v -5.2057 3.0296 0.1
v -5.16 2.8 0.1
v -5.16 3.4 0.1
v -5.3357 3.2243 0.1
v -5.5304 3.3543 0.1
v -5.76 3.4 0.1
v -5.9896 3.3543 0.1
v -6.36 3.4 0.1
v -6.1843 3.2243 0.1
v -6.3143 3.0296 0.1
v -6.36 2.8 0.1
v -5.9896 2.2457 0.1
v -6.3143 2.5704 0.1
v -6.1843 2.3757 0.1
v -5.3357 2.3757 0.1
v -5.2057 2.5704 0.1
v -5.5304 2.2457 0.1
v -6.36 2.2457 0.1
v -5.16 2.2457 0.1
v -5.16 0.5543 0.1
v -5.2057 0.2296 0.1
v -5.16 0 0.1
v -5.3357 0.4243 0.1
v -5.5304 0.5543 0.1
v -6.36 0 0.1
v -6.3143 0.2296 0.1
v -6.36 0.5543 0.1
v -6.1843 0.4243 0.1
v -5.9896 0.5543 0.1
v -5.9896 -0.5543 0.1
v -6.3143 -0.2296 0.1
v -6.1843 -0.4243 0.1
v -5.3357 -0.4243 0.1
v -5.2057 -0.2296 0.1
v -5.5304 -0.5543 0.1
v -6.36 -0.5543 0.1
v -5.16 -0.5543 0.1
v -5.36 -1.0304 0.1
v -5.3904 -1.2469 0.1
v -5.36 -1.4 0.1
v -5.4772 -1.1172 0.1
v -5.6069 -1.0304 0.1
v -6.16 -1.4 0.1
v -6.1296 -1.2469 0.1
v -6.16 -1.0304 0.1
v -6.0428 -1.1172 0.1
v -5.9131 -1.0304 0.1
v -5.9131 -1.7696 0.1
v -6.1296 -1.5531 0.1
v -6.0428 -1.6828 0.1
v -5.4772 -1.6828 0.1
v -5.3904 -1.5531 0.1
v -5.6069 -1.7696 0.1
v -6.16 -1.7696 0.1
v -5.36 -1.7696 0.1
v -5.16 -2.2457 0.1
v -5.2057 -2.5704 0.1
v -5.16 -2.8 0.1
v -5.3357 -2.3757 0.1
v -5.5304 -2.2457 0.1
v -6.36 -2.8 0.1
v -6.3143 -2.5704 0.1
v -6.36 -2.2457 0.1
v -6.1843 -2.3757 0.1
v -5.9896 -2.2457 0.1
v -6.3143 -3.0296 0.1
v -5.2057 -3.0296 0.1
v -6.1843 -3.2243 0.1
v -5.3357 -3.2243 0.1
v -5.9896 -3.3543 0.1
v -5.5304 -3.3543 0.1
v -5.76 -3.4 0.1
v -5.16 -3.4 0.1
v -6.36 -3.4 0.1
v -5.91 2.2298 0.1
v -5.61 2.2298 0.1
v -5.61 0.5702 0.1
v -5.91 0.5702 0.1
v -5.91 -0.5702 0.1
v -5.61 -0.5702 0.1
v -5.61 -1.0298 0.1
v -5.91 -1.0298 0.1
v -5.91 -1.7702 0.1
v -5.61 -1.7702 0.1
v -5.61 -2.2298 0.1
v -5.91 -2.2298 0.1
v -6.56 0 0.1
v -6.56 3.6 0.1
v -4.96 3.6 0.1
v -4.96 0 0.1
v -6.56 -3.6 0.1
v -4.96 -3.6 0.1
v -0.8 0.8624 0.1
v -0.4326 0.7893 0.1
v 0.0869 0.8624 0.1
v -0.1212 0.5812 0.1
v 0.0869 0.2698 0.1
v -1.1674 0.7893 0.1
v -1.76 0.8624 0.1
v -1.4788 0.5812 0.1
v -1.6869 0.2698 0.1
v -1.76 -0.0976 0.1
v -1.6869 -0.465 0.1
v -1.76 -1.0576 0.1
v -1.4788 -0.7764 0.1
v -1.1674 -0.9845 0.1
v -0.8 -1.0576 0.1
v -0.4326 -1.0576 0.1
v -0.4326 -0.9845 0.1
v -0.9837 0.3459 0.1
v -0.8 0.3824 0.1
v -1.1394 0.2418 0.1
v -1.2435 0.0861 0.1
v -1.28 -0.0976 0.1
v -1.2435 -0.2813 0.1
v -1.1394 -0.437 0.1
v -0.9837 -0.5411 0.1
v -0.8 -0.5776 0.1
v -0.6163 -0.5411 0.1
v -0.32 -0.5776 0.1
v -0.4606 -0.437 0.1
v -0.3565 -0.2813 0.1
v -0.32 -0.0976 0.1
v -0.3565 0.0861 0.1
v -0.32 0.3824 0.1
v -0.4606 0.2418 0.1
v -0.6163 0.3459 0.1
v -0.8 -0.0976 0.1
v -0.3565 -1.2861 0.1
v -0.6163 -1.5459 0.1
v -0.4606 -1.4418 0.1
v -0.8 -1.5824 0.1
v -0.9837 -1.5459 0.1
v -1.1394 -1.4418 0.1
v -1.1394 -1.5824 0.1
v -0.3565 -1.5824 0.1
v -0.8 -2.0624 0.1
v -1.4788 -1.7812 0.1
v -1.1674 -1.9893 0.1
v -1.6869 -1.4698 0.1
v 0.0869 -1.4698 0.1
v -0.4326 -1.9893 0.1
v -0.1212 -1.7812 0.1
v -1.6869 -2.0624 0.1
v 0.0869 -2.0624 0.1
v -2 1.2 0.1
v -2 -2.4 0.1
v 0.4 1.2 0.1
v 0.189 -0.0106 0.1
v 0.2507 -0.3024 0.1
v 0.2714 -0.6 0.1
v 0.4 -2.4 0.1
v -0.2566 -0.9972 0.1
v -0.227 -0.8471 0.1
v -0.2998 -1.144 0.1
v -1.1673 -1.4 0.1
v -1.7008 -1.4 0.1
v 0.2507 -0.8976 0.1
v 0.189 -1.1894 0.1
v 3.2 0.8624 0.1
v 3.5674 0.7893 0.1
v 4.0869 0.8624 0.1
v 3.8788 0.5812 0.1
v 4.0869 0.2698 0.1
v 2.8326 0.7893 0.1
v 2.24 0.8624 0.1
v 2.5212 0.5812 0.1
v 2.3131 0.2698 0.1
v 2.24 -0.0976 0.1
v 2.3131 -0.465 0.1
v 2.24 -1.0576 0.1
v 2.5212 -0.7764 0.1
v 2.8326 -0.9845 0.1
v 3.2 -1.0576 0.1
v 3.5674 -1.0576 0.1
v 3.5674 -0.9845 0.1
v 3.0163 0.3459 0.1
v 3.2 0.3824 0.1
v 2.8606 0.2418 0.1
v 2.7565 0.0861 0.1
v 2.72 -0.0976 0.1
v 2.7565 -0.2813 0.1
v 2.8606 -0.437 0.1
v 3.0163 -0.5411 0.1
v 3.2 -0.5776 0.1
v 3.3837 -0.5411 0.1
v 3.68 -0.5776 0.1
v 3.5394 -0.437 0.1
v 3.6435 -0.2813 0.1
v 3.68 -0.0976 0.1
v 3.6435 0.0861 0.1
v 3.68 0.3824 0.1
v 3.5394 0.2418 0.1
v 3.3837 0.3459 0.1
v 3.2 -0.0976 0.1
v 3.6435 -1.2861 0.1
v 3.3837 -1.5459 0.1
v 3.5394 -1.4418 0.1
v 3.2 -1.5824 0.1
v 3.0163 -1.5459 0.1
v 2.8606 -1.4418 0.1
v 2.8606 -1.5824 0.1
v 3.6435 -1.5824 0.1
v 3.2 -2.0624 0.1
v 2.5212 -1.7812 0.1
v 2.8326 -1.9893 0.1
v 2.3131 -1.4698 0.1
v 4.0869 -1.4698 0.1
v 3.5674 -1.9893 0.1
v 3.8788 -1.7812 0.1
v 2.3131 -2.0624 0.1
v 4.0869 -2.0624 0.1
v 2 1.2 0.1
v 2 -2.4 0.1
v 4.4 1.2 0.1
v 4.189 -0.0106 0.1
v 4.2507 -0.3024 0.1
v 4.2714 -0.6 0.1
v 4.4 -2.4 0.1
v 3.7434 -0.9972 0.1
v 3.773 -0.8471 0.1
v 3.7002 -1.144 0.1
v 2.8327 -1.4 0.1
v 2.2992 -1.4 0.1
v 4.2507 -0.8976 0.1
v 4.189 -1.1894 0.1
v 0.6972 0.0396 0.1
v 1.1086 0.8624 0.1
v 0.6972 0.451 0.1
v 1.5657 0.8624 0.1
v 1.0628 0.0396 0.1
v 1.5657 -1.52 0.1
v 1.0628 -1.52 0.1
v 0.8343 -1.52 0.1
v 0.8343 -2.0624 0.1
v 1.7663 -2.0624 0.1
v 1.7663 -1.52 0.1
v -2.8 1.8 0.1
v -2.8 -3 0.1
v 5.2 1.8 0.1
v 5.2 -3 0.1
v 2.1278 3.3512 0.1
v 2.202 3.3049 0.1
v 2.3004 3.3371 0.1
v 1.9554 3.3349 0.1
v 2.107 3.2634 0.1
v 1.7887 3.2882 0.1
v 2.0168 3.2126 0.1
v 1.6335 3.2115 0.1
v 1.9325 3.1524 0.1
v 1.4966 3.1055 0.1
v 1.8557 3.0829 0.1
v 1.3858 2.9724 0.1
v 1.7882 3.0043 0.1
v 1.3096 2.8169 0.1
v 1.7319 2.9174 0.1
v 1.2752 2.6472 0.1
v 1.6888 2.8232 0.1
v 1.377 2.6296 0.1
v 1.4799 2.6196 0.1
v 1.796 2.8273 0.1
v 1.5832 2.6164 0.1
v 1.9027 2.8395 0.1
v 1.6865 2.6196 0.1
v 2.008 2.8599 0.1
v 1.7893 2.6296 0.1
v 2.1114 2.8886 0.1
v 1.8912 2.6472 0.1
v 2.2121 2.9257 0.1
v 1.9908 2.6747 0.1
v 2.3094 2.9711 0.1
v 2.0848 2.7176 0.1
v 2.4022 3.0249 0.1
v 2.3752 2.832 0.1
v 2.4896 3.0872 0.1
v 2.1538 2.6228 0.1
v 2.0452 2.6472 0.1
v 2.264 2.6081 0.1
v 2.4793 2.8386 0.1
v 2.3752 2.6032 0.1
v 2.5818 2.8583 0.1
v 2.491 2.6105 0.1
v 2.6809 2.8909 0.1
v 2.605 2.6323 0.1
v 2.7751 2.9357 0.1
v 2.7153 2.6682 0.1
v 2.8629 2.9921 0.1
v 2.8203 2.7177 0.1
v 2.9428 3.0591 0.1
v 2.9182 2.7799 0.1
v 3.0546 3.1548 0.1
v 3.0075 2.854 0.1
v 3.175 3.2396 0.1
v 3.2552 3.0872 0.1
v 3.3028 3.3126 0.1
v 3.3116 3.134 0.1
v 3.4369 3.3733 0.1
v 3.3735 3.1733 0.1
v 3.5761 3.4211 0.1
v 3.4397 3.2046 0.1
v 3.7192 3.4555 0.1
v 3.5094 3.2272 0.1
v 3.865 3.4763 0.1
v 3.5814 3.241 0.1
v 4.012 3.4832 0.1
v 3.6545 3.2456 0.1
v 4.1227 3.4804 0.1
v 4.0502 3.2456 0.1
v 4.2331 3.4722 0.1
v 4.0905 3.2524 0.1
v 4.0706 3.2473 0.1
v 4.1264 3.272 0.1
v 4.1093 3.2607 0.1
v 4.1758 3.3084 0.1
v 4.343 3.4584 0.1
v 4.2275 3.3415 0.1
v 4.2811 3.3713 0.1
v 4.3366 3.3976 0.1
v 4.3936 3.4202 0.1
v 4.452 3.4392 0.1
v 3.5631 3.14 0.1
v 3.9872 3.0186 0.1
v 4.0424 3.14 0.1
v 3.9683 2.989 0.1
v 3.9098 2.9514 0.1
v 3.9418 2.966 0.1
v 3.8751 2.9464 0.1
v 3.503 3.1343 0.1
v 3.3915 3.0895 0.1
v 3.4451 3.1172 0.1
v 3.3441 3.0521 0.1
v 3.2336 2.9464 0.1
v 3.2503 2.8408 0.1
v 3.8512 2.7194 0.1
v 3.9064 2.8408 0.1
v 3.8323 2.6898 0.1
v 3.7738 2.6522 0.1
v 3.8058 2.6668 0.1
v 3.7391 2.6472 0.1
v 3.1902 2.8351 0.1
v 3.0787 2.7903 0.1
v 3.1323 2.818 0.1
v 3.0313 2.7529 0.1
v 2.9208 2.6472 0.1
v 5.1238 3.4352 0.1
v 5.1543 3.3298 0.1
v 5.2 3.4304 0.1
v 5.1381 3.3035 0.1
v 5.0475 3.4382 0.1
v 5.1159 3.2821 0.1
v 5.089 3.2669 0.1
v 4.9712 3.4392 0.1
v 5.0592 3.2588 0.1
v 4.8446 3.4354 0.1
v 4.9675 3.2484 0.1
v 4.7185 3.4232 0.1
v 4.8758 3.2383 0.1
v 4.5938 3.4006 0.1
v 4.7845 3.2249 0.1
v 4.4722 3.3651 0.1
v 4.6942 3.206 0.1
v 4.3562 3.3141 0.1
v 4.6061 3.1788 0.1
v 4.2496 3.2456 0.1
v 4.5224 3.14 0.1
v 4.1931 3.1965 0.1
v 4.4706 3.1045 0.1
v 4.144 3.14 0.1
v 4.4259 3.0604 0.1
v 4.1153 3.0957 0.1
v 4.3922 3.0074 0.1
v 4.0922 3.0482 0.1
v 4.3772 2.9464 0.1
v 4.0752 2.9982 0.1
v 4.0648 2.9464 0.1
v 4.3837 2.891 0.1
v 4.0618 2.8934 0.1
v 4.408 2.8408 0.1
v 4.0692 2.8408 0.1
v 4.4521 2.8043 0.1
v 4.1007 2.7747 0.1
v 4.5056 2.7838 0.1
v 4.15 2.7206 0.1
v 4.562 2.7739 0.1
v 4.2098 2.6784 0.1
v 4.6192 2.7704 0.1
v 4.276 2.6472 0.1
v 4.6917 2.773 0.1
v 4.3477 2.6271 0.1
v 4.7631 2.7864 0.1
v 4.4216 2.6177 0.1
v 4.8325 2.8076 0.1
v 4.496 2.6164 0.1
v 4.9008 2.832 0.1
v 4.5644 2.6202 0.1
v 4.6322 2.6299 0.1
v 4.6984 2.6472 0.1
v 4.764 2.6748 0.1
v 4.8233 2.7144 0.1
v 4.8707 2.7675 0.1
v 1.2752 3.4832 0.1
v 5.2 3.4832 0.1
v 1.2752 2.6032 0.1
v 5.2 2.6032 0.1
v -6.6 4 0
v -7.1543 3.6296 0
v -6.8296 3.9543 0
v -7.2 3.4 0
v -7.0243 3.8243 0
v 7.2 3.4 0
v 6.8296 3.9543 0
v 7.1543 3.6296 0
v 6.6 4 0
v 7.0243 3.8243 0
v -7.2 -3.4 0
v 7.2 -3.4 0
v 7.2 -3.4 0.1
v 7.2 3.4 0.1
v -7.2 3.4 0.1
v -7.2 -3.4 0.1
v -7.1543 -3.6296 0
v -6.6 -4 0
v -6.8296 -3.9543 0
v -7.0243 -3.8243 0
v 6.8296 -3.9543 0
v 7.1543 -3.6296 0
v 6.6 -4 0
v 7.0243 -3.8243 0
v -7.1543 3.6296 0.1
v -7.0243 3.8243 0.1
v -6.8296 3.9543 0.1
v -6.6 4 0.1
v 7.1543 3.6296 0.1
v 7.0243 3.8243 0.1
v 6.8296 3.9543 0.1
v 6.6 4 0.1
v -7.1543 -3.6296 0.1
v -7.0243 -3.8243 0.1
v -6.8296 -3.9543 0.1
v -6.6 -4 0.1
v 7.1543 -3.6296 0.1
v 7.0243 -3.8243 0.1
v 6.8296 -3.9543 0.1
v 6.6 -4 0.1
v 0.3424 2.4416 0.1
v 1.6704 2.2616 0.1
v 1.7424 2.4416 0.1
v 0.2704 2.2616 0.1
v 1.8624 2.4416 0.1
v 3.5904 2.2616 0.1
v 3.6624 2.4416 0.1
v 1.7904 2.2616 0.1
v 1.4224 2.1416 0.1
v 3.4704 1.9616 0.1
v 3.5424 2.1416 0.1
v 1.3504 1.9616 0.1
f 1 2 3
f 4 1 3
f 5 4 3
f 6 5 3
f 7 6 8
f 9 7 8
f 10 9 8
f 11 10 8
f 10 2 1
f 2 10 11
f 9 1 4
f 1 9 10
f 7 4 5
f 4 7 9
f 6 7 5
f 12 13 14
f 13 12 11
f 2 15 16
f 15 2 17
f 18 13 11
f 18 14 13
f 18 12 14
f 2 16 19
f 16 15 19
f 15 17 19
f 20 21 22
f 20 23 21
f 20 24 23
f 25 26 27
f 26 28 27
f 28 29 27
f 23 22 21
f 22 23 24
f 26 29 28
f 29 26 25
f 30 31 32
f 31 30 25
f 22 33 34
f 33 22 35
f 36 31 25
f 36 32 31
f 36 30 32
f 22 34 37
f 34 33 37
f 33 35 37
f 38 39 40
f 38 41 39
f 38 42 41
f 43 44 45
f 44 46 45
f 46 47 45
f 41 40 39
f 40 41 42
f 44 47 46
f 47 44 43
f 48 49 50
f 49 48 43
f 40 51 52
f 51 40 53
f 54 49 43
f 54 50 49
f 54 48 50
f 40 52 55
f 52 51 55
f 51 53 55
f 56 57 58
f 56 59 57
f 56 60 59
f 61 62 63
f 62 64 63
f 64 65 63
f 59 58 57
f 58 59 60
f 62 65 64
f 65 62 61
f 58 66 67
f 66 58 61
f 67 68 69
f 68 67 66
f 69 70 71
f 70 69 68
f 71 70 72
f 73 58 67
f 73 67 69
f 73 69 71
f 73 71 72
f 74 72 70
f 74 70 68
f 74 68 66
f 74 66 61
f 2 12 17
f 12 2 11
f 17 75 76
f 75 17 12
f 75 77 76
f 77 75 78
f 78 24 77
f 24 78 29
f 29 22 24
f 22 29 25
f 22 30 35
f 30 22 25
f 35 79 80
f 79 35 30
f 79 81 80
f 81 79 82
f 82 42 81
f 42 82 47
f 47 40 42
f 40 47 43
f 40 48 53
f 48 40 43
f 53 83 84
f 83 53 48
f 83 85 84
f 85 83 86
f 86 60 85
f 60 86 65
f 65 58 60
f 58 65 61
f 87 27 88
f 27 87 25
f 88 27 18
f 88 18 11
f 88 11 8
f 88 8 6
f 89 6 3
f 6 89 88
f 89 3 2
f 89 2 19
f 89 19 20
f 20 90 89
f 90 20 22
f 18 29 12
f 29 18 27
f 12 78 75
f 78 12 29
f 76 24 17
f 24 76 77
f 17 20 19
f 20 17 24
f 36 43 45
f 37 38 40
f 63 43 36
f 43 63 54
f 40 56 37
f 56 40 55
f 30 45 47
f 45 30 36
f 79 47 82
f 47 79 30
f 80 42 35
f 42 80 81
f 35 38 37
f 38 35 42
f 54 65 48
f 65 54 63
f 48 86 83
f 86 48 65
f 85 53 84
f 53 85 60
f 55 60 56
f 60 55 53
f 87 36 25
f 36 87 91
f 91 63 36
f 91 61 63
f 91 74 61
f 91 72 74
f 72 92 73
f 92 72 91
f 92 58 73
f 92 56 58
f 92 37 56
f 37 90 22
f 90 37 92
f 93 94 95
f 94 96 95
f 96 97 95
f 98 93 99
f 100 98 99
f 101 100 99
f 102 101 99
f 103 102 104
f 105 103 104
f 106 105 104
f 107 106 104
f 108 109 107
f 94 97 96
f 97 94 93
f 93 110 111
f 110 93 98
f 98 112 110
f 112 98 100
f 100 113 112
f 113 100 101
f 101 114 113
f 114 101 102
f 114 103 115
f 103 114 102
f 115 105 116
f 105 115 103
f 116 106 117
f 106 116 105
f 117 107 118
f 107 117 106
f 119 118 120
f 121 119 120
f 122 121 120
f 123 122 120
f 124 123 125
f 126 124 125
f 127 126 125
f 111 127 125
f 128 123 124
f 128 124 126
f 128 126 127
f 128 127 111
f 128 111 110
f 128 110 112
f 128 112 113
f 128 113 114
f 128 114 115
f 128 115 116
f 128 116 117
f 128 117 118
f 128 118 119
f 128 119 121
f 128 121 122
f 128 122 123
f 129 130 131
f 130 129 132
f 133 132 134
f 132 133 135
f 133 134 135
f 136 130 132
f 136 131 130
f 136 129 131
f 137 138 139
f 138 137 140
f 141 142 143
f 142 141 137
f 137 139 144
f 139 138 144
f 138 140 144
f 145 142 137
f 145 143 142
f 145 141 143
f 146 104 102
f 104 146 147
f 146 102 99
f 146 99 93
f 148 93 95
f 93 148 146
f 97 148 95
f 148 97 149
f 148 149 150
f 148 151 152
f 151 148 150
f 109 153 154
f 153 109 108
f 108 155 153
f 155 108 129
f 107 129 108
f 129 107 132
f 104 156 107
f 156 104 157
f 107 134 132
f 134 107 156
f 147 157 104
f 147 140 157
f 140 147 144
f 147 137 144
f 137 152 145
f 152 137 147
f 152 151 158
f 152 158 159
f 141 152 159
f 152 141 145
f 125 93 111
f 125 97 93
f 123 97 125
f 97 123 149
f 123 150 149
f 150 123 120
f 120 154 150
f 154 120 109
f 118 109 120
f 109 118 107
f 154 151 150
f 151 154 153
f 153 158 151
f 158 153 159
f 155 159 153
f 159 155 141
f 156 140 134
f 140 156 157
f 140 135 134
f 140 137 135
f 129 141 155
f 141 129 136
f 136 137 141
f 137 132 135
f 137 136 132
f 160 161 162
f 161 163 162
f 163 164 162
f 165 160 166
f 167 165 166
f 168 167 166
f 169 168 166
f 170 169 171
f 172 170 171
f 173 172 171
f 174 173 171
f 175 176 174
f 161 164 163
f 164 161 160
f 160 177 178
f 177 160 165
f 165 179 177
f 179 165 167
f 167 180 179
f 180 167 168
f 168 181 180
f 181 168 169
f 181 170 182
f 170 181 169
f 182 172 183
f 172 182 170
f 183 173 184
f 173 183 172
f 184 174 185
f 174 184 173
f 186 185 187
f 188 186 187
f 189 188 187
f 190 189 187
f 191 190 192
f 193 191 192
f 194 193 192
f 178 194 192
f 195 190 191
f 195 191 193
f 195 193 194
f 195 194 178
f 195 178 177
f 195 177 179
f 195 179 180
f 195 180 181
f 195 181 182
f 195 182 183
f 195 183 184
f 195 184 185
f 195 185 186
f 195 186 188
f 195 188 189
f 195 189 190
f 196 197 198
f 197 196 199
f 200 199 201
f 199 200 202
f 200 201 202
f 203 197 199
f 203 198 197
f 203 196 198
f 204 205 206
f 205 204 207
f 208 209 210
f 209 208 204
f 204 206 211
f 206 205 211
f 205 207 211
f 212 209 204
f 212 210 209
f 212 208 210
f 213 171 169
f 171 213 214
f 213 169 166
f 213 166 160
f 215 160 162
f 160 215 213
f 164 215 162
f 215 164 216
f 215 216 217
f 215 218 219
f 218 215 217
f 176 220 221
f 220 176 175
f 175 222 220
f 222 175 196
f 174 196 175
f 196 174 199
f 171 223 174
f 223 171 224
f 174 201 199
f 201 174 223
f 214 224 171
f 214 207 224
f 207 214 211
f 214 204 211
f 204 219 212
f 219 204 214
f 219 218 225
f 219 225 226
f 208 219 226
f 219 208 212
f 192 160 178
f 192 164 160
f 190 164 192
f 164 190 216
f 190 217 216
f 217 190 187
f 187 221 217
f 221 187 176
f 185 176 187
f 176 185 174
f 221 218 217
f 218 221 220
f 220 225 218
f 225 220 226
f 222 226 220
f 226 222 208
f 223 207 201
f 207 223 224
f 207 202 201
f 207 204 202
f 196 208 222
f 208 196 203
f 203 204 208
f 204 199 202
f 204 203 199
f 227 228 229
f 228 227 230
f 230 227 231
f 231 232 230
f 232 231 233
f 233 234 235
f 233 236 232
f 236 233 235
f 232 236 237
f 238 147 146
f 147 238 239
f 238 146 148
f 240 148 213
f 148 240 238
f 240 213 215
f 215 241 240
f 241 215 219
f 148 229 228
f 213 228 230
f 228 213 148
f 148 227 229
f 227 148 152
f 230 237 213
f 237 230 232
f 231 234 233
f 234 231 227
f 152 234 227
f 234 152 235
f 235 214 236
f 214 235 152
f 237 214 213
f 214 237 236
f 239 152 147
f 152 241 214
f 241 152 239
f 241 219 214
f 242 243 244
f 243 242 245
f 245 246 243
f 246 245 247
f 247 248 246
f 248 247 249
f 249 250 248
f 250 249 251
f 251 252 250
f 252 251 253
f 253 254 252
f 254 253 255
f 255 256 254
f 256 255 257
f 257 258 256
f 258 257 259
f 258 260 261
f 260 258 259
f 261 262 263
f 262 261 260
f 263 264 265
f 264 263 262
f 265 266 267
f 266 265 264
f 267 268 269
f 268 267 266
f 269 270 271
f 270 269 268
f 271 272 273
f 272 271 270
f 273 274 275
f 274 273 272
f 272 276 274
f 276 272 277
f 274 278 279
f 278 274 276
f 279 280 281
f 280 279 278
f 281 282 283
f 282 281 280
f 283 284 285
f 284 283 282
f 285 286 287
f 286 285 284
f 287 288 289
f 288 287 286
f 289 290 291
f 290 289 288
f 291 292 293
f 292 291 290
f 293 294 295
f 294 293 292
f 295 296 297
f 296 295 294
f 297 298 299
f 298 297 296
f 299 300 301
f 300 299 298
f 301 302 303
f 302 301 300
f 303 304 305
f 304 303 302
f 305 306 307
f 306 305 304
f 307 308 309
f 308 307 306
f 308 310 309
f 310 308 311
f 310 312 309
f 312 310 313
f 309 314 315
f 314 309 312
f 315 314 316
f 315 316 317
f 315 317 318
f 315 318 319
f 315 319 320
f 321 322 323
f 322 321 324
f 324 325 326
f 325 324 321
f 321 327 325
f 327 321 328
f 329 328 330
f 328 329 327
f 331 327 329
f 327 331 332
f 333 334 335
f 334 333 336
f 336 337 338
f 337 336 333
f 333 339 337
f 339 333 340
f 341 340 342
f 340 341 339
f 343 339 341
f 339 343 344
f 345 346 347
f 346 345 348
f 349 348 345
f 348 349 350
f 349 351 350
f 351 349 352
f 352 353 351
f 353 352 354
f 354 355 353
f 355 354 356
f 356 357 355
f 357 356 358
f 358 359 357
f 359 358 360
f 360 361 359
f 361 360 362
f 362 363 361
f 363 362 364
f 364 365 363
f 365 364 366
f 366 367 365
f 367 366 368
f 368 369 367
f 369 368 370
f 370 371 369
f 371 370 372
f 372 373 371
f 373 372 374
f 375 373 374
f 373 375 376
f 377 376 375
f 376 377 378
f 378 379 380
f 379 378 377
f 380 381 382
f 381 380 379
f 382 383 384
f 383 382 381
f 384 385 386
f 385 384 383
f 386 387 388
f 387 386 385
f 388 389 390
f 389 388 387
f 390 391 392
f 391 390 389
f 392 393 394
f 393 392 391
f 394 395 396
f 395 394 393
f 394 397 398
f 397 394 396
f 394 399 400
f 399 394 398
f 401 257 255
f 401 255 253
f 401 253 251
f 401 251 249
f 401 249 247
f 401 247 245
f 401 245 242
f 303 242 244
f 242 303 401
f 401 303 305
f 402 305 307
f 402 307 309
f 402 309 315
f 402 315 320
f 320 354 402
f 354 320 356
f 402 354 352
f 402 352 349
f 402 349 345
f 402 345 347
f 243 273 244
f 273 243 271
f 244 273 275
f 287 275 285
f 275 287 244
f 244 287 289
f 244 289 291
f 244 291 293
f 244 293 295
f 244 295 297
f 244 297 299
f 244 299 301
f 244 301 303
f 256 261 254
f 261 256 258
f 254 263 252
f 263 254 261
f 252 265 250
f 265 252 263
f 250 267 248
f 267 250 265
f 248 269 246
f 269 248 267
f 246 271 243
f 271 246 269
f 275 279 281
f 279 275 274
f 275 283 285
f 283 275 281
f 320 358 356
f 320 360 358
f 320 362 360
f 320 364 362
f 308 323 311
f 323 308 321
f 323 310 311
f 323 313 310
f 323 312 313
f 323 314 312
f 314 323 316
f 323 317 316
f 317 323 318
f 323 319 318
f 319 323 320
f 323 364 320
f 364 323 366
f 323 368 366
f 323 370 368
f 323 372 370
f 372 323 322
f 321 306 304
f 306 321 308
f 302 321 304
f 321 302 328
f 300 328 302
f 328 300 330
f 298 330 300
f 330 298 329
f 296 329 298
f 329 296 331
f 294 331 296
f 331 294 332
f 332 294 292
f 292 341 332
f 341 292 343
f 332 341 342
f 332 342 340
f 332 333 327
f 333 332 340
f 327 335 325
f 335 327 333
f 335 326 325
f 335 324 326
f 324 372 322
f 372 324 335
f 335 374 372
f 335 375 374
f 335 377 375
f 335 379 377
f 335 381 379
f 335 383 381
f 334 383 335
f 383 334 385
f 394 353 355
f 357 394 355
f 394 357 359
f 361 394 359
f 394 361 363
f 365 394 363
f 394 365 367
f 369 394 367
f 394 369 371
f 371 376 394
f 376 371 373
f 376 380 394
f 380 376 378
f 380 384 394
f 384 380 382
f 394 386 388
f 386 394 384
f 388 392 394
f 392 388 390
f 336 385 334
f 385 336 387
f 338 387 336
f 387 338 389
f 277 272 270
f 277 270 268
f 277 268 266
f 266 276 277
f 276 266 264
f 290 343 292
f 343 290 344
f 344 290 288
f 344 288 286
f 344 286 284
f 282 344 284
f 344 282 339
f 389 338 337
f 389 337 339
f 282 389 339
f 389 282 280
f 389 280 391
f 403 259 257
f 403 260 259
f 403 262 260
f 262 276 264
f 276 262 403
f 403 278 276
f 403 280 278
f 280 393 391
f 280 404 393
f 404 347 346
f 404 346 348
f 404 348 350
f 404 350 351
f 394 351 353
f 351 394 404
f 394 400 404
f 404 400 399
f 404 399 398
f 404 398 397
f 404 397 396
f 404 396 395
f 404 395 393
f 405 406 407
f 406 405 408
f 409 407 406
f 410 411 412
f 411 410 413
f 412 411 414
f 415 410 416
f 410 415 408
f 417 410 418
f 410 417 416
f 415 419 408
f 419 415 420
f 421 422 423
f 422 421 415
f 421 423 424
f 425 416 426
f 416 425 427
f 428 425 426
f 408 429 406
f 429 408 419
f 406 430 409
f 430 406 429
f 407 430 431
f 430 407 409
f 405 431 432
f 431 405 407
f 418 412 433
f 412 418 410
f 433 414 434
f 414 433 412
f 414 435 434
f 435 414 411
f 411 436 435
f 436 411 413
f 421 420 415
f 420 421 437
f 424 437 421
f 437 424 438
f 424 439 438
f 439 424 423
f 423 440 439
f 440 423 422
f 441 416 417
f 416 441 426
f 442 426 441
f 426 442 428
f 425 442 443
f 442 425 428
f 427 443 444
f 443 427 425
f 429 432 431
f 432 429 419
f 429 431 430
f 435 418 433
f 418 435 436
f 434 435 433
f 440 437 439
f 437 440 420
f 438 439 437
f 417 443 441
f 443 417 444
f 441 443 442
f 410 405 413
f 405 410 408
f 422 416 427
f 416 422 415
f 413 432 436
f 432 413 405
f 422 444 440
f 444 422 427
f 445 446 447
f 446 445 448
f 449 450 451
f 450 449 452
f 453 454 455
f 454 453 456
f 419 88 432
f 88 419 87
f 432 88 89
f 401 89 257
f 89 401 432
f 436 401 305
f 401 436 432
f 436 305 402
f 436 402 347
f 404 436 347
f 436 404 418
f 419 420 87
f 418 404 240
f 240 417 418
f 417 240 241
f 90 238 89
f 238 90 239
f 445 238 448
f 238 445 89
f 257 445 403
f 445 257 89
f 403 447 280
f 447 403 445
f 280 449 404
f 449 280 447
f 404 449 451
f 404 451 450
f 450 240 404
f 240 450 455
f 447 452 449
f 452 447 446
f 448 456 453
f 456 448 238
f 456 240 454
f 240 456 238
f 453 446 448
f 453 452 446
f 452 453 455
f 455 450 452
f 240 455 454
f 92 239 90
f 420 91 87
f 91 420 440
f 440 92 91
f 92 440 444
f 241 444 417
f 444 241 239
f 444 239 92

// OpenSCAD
use <../lib.scad>
use <../p/1-4chrd.scad>
use <../p/1-4cyli.scad>
use <../p/box3u12.scad>
use <../p/logo-wec-box.scad>
use <../p/logo-wec-text.scad>
use <s/6148328bss01.scad>
use <s/6148328bss02.scad>
function ldraw_lib__6148328bs() = [
// 0 Sticker  1.0 x  1.8 with White "919" in Red Square on White Background Left
// 0 Name: 6148328bs.dat
// 0 Author: Massimo Maso [Sirio]
// 0 !LDRAW_ORG Part UPDATE 2024-08
// 0 !LICENSE Licensed under CC BY 4.0 : see CAreadme.txt
// 
// 0 BFC CERTIFY CCW
  [0,"BFC","CERTIFY"],
  [0,"BFC","CCW"],
// 
// 0 !KEYWORDS 919, Bricklink 75876stk01, Brickowl 852010, Hybrid, Pit Lane
// 0 !KEYWORDS Porsche, Rebrickable 26357, set 75876, Speed Champions
// 
// 0 !HISTORY 2024-09-30 [OrionP] Official Update 2024-08
// 
// 0 // Subparts
// 1 15 -14.4 -.25 0 1 0 0 0 1 0 0 0 1 s\6148328bss01.dat
  [1,15,-14.4,-.25,0,1,0,0,0,1,0,0,0,1, ldraw_lib__s__6148328bss01()],
// 1 15 3 -.25 -1.5 1 0 0 0 1 0 0 0 1 s\6148328bss02.dat
  [1,15,3,-.25,-1.5,1,0,0,0,1,0,0,0,1, ldraw_lib__s__6148328bss02()],
// 0 // Logo primitive
// 1 0 8.094 -.25 7.608 .22 0 0 0 1 0 0 0 .22 logo-wec-text.dat
  [1,0,8.094,-.25,7.608,.22,0,0,0,1,0,0,0,.22, ldraw_lib__logo_wec_text()],
// 1 15 8.094 -.25 7.608 .22 0 0 0 1 0 0 0 .22 logo-wec-box.dat
  [1,15,8.094,-.25,7.608,.22,0,0,0,1,0,0,0,.22, ldraw_lib__logo_wec_box()],
// 0 // Primitives
// 1 16 -16.5 0 8.5 -1.5 0 0 0 -1 0 0 0 1.5 1-4chrd.dat
  [1,16,-16.5,0,8.5,-1.5,0,0,0,-1,0,0,0,1.5, ldraw_lib__1_4chrd()],
// 1 16 16.5 0 8.5 1.5 0 0 0 -1 0 0 0 1.5 1-4chrd.dat
  [1,16,16.5,0,8.5,1.5,0,0,0,-1,0,0,0,1.5, ldraw_lib__1_4chrd()],
// 1 16 0 -.25 0 0 0 18 0 .25 0 8.5 0 0 box3u12.dat
  [1,16,0,-.25,0,0,0,18,0,.25,0,8.5,0,0, ldraw_lib__box3u12()],
// 1 16 -16.5 0 -8.5 -1.5 0 0 0 -1 0 0 0 -1.5 1-4chrd.dat
  [1,16,-16.5,0,-8.5,-1.5,0,0,0,-1,0,0,0,-1.5, ldraw_lib__1_4chrd()],
// 1 16 16.5 0 -8.5 1.5 0 0 0 -1 0 0 0 -1.5 1-4chrd.dat
  [1,16,16.5,0,-8.5,1.5,0,0,0,-1,0,0,0,-1.5, ldraw_lib__1_4chrd()],
// 1 16 -16.5 0 8.5 -1.5 0 0 0 -.25 0 0 0 1.5 1-4cyli.dat
  [1,16,-16.5,0,8.5,-1.5,0,0,0,-.25,0,0,0,1.5, ldraw_lib__1_4cyli()],
// 1 16 16.5 0 8.5 1.5 0 0 0 -.25 0 0 0 1.5 1-4cyli.dat
  [1,16,16.5,0,8.5,1.5,0,0,0,-.25,0,0,0,1.5, ldraw_lib__1_4cyli()],
// 1 16 -16.5 0 -8.5 -1.5 0 0 0 -.25 0 0 0 -1.5 1-4cyli.dat
  [1,16,-16.5,0,-8.5,-1.5,0,0,0,-.25,0,0,0,-1.5, ldraw_lib__1_4cyli()],
// 1 16 16.5 0 -8.5 1.5 0 0 0 -.25 0 0 0 -1.5 1-4cyli.dat
  [1,16,16.5,0,-8.5,1.5,0,0,0,-.25,0,0,0,-1.5, ldraw_lib__1_4cyli()],
// 1 15 -16.5 -.25 8.5 -1.5 0 0 0 1 0 0 0 1.5 1-4chrd.dat
  [1,15,-16.5,-.25,8.5,-1.5,0,0,0,1,0,0,0,1.5, ldraw_lib__1_4chrd()],
// 1 15 16.5 -.25 8.5 1.5 0 0 0 1 0 0 0 1.5 1-4chrd.dat
  [1,15,16.5,-.25,8.5,1.5,0,0,0,1,0,0,0,1.5, ldraw_lib__1_4chrd()],
// 1 15 -16.5 -.25 -8.5 -1.5 0 0 0 1 0 0 0 -1.5 1-4chrd.dat
  [1,15,-16.5,-.25,-8.5,-1.5,0,0,0,1,0,0,0,-1.5, ldraw_lib__1_4chrd()],
// 1 15 16.5 -.25 -8.5 1.5 0 0 0 1 0 0 0 -1.5 1-4chrd.dat
  [1,15,16.5,-.25,-8.5,1.5,0,0,0,1,0,0,0,-1.5, ldraw_lib__1_4chrd()],
// 0 // Bottom faces
// 4 16 16.5 0 10 18 0 8.5 -18 0 8.5 -16.5 0 10
  [4,16,16.5,0,10,18,0,8.5,-18,0,8.5,-16.5,0,10],
// 4 16 16.5 0 -10 -16.5 0 -10 -18 0 -8.5 18 0 -8.5
  [4,16,16.5,0,-10,-16.5,0,-10,-18,0,-8.5,18,0,-8.5],
// 0 // Lateral faces
// 4 16 -16.5 0 10 -16.5 -.25 10 16.5 -.25 10 16.5 0 10
  [4,16,-16.5,0,10,-16.5,-.25,10,16.5,-.25,10,16.5,0,10],
// 4 16 -16.5 0 -10 16.5 0 -10 16.5 -.25 -10 -16.5 -.25 -10
  [4,16,-16.5,0,-10,16.5,0,-10,16.5,-.25,-10,-16.5,-.25,-10],
// 0 // Top faces
// 0 // Black faces
// 4 0 .856 -.25 6.104 .676 -.25 5.654 4.176 -.25 5.654 4.356 -.25 6.104
  [4,0,.856,-.25,6.104,.676,-.25,5.654,4.176,-.25,5.654,4.356,-.25,6.104],
// 4 0 4.656 -.25 6.104 4.476 -.25 5.654 8.976 -.25 5.654 9.156 -.25 6.104
  [4,0,4.656,-.25,6.104,4.476,-.25,5.654,8.976,-.25,5.654,9.156,-.25,6.104],
// 4 0 3.556 -.25 5.354 3.376 -.25 4.904 8.676 -.25 4.904 8.856 -.25 5.354
  [4,0,3.556,-.25,5.354,3.376,-.25,4.904,8.676,-.25,4.904,8.856,-.25,5.354],
// 0 // White faces
// 4 15 -16.5 -.25 10 -18 -.25 8.5 -16.4 -.25 0 -16.4 -.25 9
  [4,15,-16.5,-.25,10,-18,-.25,8.5,-16.4,-.25,0,-16.4,-.25,9],
// 3 15 -16.5 -.25 10 -16.4 -.25 9 -12.4 -.25 9
  [3,15,-16.5,-.25,10,-16.4,-.25,9,-12.4,-.25,9],
// 4 15 -16.5 -.25 10 -12.4 -.25 9 3.188 -.25 6.618 3.188 -.25 8.708
  [4,15,-16.5,-.25,10,-12.4,-.25,9,3.188,-.25,6.618,3.188,-.25,8.708],
// 4 15 -16.5 -.25 10 3.188 -.25 8.708 10.03 -.25 8.708 16.5 -.25 10
  [4,15,-16.5,-.25,10,3.188,-.25,8.708,10.03,-.25,8.708,16.5,-.25,10],
// 3 15 16.5 -.25 10 10.03 -.25 8.708 13 -.25 8.708
  [3,15,16.5,-.25,10,10.03,-.25,8.708,13,-.25,8.708],
// 3 15 16.5 -.25 10 13 -.25 8.708 13 -.25 8.576
  [3,15,16.5,-.25,10,13,-.25,8.708,13,-.25,8.576],
// 4 15 16.5 -.25 10 13 -.25 8.576 13 -.25 6.508 18 -.25 8.5
  [4,15,16.5,-.25,10,13,-.25,8.576,13,-.25,6.508,18,-.25,8.5],
// 3 15 -18 -.25 8.5 -18 -.25 -8.5 -16.4 -.25 0
  [3,15,-18,-.25,8.5,-18,-.25,-8.5,-16.4,-.25,0],
// 3 15 18 -.25 8.5 13 -.25 6.508 13 -.25 4.5
  [3,15,18,-.25,8.5,13,-.25,6.508,13,-.25,4.5],
// 4 15 18 -.25 8.5 13 -.25 4.5 13 -.25 -7.5 18 -.25 -8.5
  [4,15,18,-.25,8.5,13,-.25,4.5,13,-.25,-7.5,18,-.25,-8.5],
// 4 15 -12.4 -.25 9 -12.4 -.25 0 -7 -.25 -7.5 -7 -.25 4.5
  [4,15,-12.4,-.25,9,-12.4,-.25,0,-7,-.25,-7.5,-7,-.25,4.5],
// 4 15 -12.4 -.25 9 -7 -.25 4.5 .676 -.25 5.654 .856 -.25 6.104
  [4,15,-12.4,-.25,9,-7,-.25,4.5,.676,-.25,5.654,.856,-.25,6.104],
// 4 15 -12.4 -.25 9 .856 -.25 6.104 3.188 -.25 6.508 3.188 -.25 6.618
  [4,15,-12.4,-.25,9,.856,-.25,6.104,3.188,-.25,6.508,3.188,-.25,6.618],
// 4 15 3.188 -.25 6.508 .856 -.25 6.104 4.356 -.25 6.104 5.938 -.25 6.508
  [4,15,3.188,-.25,6.508,.856,-.25,6.104,4.356,-.25,6.104,5.938,-.25,6.508],
// 4 15 5.938 -.25 6.508 4.356 -.25 6.104 4.656 -.25 6.104 13 -.25 6.508
  [4,15,5.938,-.25,6.508,4.356,-.25,6.104,4.656,-.25,6.104,13,-.25,6.508],
// 3 15 13 -.25 6.508 4.656 -.25 6.104 9.156 -.25 6.104
  [3,15,13,-.25,6.508,4.656,-.25,6.104,9.156,-.25,6.104],
// 3 15 13 -.25 6.508 9.156 -.25 6.104 8.976 -.25 5.654
  [3,15,13,-.25,6.508,9.156,-.25,6.104,8.976,-.25,5.654],
// 4 15 13 -.25 6.508 8.976 -.25 5.654 8.856 -.25 5.354 13 -.25 4.5
  [4,15,13,-.25,6.508,8.976,-.25,5.654,8.856,-.25,5.354,13,-.25,4.5],
// 4 15 4.356 -.25 6.104 4.176 -.25 5.654 4.476 -.25 5.654 4.656 -.25 6.104
  [4,15,4.356,-.25,6.104,4.176,-.25,5.654,4.476,-.25,5.654,4.656,-.25,6.104],
// 4 15 -7 -.25 4.5 3.376 -.25 4.904 3.556 -.25 5.354 .676 -.25 5.654
  [4,15,-7,-.25,4.5,3.376,-.25,4.904,3.556,-.25,5.354,.676,-.25,5.654],
// 4 15 -7 -.25 4.5 13 -.25 4.5 8.676 -.25 4.904 3.376 -.25 4.904
  [4,15,-7,-.25,4.5,13,-.25,4.5,8.676,-.25,4.904,3.376,-.25,4.904],
// 3 15 3.556 -.25 5.354 4.176 -.25 5.654 .676 -.25 5.654
  [3,15,3.556,-.25,5.354,4.176,-.25,5.654,.676,-.25,5.654],
// 4 15 3.556 -.25 5.354 8.856 -.25 5.354 4.476 -.25 5.654 4.176 -.25 5.654
  [4,15,3.556,-.25,5.354,8.856,-.25,5.354,4.476,-.25,5.654,4.176,-.25,5.654],
// 3 15 8.856 -.25 5.354 8.976 -.25 5.654 4.476 -.25 5.654
  [3,15,8.856,-.25,5.354,8.976,-.25,5.654,4.476,-.25,5.654],
// 3 15 13 -.25 4.5 8.856 -.25 5.354 8.676 -.25 4.904
  [3,15,13,-.25,4.5,8.856,-.25,5.354,8.676,-.25,4.904],
// 3 15 -12.4 -.25 -9 -7 -.25 -7.5 -12.4 -.25 0
  [3,15,-12.4,-.25,-9,-7,-.25,-7.5,-12.4,-.25,0],
// 4 15 -16.5 -.25 -10 -16.4 -.25 -9 -16.4 -.25 0 -18 -.25 -8.5
  [4,15,-16.5,-.25,-10,-16.4,-.25,-9,-16.4,-.25,0,-18,-.25,-8.5],
// 4 15 -16.5 -.25 -10 16.5 -.25 -10 -12.4 -.25 -9 -16.4 -.25 -9
  [4,15,-16.5,-.25,-10,16.5,-.25,-10,-12.4,-.25,-9,-16.4,-.25,-9],
// 4 15 16.5 -.25 -10 18 -.25 -8.5 13 -.25 -7.5 -7 -.25 -7.5
  [4,15,16.5,-.25,-10,18,-.25,-8.5,13,-.25,-7.5,-7,-.25,-7.5],
// 3 15 16.5 -.25 -10 -7 -.25 -7.5 -12.4 -.25 -9
  [3,15,16.5,-.25,-10,-7,-.25,-7.5,-12.4,-.25,-9],
];
module ldraw_lib__6148328bs(step=0, col=false, unit=2/5, alt=false, line=0.2, solid=!$preview)
    makepoly(ldraw_lib__6148328bs(), step=step, col=col, unit=unit, alt=alt, line=line, solid=solid);
ldraw_lib__6148328bs(line=0.2);
